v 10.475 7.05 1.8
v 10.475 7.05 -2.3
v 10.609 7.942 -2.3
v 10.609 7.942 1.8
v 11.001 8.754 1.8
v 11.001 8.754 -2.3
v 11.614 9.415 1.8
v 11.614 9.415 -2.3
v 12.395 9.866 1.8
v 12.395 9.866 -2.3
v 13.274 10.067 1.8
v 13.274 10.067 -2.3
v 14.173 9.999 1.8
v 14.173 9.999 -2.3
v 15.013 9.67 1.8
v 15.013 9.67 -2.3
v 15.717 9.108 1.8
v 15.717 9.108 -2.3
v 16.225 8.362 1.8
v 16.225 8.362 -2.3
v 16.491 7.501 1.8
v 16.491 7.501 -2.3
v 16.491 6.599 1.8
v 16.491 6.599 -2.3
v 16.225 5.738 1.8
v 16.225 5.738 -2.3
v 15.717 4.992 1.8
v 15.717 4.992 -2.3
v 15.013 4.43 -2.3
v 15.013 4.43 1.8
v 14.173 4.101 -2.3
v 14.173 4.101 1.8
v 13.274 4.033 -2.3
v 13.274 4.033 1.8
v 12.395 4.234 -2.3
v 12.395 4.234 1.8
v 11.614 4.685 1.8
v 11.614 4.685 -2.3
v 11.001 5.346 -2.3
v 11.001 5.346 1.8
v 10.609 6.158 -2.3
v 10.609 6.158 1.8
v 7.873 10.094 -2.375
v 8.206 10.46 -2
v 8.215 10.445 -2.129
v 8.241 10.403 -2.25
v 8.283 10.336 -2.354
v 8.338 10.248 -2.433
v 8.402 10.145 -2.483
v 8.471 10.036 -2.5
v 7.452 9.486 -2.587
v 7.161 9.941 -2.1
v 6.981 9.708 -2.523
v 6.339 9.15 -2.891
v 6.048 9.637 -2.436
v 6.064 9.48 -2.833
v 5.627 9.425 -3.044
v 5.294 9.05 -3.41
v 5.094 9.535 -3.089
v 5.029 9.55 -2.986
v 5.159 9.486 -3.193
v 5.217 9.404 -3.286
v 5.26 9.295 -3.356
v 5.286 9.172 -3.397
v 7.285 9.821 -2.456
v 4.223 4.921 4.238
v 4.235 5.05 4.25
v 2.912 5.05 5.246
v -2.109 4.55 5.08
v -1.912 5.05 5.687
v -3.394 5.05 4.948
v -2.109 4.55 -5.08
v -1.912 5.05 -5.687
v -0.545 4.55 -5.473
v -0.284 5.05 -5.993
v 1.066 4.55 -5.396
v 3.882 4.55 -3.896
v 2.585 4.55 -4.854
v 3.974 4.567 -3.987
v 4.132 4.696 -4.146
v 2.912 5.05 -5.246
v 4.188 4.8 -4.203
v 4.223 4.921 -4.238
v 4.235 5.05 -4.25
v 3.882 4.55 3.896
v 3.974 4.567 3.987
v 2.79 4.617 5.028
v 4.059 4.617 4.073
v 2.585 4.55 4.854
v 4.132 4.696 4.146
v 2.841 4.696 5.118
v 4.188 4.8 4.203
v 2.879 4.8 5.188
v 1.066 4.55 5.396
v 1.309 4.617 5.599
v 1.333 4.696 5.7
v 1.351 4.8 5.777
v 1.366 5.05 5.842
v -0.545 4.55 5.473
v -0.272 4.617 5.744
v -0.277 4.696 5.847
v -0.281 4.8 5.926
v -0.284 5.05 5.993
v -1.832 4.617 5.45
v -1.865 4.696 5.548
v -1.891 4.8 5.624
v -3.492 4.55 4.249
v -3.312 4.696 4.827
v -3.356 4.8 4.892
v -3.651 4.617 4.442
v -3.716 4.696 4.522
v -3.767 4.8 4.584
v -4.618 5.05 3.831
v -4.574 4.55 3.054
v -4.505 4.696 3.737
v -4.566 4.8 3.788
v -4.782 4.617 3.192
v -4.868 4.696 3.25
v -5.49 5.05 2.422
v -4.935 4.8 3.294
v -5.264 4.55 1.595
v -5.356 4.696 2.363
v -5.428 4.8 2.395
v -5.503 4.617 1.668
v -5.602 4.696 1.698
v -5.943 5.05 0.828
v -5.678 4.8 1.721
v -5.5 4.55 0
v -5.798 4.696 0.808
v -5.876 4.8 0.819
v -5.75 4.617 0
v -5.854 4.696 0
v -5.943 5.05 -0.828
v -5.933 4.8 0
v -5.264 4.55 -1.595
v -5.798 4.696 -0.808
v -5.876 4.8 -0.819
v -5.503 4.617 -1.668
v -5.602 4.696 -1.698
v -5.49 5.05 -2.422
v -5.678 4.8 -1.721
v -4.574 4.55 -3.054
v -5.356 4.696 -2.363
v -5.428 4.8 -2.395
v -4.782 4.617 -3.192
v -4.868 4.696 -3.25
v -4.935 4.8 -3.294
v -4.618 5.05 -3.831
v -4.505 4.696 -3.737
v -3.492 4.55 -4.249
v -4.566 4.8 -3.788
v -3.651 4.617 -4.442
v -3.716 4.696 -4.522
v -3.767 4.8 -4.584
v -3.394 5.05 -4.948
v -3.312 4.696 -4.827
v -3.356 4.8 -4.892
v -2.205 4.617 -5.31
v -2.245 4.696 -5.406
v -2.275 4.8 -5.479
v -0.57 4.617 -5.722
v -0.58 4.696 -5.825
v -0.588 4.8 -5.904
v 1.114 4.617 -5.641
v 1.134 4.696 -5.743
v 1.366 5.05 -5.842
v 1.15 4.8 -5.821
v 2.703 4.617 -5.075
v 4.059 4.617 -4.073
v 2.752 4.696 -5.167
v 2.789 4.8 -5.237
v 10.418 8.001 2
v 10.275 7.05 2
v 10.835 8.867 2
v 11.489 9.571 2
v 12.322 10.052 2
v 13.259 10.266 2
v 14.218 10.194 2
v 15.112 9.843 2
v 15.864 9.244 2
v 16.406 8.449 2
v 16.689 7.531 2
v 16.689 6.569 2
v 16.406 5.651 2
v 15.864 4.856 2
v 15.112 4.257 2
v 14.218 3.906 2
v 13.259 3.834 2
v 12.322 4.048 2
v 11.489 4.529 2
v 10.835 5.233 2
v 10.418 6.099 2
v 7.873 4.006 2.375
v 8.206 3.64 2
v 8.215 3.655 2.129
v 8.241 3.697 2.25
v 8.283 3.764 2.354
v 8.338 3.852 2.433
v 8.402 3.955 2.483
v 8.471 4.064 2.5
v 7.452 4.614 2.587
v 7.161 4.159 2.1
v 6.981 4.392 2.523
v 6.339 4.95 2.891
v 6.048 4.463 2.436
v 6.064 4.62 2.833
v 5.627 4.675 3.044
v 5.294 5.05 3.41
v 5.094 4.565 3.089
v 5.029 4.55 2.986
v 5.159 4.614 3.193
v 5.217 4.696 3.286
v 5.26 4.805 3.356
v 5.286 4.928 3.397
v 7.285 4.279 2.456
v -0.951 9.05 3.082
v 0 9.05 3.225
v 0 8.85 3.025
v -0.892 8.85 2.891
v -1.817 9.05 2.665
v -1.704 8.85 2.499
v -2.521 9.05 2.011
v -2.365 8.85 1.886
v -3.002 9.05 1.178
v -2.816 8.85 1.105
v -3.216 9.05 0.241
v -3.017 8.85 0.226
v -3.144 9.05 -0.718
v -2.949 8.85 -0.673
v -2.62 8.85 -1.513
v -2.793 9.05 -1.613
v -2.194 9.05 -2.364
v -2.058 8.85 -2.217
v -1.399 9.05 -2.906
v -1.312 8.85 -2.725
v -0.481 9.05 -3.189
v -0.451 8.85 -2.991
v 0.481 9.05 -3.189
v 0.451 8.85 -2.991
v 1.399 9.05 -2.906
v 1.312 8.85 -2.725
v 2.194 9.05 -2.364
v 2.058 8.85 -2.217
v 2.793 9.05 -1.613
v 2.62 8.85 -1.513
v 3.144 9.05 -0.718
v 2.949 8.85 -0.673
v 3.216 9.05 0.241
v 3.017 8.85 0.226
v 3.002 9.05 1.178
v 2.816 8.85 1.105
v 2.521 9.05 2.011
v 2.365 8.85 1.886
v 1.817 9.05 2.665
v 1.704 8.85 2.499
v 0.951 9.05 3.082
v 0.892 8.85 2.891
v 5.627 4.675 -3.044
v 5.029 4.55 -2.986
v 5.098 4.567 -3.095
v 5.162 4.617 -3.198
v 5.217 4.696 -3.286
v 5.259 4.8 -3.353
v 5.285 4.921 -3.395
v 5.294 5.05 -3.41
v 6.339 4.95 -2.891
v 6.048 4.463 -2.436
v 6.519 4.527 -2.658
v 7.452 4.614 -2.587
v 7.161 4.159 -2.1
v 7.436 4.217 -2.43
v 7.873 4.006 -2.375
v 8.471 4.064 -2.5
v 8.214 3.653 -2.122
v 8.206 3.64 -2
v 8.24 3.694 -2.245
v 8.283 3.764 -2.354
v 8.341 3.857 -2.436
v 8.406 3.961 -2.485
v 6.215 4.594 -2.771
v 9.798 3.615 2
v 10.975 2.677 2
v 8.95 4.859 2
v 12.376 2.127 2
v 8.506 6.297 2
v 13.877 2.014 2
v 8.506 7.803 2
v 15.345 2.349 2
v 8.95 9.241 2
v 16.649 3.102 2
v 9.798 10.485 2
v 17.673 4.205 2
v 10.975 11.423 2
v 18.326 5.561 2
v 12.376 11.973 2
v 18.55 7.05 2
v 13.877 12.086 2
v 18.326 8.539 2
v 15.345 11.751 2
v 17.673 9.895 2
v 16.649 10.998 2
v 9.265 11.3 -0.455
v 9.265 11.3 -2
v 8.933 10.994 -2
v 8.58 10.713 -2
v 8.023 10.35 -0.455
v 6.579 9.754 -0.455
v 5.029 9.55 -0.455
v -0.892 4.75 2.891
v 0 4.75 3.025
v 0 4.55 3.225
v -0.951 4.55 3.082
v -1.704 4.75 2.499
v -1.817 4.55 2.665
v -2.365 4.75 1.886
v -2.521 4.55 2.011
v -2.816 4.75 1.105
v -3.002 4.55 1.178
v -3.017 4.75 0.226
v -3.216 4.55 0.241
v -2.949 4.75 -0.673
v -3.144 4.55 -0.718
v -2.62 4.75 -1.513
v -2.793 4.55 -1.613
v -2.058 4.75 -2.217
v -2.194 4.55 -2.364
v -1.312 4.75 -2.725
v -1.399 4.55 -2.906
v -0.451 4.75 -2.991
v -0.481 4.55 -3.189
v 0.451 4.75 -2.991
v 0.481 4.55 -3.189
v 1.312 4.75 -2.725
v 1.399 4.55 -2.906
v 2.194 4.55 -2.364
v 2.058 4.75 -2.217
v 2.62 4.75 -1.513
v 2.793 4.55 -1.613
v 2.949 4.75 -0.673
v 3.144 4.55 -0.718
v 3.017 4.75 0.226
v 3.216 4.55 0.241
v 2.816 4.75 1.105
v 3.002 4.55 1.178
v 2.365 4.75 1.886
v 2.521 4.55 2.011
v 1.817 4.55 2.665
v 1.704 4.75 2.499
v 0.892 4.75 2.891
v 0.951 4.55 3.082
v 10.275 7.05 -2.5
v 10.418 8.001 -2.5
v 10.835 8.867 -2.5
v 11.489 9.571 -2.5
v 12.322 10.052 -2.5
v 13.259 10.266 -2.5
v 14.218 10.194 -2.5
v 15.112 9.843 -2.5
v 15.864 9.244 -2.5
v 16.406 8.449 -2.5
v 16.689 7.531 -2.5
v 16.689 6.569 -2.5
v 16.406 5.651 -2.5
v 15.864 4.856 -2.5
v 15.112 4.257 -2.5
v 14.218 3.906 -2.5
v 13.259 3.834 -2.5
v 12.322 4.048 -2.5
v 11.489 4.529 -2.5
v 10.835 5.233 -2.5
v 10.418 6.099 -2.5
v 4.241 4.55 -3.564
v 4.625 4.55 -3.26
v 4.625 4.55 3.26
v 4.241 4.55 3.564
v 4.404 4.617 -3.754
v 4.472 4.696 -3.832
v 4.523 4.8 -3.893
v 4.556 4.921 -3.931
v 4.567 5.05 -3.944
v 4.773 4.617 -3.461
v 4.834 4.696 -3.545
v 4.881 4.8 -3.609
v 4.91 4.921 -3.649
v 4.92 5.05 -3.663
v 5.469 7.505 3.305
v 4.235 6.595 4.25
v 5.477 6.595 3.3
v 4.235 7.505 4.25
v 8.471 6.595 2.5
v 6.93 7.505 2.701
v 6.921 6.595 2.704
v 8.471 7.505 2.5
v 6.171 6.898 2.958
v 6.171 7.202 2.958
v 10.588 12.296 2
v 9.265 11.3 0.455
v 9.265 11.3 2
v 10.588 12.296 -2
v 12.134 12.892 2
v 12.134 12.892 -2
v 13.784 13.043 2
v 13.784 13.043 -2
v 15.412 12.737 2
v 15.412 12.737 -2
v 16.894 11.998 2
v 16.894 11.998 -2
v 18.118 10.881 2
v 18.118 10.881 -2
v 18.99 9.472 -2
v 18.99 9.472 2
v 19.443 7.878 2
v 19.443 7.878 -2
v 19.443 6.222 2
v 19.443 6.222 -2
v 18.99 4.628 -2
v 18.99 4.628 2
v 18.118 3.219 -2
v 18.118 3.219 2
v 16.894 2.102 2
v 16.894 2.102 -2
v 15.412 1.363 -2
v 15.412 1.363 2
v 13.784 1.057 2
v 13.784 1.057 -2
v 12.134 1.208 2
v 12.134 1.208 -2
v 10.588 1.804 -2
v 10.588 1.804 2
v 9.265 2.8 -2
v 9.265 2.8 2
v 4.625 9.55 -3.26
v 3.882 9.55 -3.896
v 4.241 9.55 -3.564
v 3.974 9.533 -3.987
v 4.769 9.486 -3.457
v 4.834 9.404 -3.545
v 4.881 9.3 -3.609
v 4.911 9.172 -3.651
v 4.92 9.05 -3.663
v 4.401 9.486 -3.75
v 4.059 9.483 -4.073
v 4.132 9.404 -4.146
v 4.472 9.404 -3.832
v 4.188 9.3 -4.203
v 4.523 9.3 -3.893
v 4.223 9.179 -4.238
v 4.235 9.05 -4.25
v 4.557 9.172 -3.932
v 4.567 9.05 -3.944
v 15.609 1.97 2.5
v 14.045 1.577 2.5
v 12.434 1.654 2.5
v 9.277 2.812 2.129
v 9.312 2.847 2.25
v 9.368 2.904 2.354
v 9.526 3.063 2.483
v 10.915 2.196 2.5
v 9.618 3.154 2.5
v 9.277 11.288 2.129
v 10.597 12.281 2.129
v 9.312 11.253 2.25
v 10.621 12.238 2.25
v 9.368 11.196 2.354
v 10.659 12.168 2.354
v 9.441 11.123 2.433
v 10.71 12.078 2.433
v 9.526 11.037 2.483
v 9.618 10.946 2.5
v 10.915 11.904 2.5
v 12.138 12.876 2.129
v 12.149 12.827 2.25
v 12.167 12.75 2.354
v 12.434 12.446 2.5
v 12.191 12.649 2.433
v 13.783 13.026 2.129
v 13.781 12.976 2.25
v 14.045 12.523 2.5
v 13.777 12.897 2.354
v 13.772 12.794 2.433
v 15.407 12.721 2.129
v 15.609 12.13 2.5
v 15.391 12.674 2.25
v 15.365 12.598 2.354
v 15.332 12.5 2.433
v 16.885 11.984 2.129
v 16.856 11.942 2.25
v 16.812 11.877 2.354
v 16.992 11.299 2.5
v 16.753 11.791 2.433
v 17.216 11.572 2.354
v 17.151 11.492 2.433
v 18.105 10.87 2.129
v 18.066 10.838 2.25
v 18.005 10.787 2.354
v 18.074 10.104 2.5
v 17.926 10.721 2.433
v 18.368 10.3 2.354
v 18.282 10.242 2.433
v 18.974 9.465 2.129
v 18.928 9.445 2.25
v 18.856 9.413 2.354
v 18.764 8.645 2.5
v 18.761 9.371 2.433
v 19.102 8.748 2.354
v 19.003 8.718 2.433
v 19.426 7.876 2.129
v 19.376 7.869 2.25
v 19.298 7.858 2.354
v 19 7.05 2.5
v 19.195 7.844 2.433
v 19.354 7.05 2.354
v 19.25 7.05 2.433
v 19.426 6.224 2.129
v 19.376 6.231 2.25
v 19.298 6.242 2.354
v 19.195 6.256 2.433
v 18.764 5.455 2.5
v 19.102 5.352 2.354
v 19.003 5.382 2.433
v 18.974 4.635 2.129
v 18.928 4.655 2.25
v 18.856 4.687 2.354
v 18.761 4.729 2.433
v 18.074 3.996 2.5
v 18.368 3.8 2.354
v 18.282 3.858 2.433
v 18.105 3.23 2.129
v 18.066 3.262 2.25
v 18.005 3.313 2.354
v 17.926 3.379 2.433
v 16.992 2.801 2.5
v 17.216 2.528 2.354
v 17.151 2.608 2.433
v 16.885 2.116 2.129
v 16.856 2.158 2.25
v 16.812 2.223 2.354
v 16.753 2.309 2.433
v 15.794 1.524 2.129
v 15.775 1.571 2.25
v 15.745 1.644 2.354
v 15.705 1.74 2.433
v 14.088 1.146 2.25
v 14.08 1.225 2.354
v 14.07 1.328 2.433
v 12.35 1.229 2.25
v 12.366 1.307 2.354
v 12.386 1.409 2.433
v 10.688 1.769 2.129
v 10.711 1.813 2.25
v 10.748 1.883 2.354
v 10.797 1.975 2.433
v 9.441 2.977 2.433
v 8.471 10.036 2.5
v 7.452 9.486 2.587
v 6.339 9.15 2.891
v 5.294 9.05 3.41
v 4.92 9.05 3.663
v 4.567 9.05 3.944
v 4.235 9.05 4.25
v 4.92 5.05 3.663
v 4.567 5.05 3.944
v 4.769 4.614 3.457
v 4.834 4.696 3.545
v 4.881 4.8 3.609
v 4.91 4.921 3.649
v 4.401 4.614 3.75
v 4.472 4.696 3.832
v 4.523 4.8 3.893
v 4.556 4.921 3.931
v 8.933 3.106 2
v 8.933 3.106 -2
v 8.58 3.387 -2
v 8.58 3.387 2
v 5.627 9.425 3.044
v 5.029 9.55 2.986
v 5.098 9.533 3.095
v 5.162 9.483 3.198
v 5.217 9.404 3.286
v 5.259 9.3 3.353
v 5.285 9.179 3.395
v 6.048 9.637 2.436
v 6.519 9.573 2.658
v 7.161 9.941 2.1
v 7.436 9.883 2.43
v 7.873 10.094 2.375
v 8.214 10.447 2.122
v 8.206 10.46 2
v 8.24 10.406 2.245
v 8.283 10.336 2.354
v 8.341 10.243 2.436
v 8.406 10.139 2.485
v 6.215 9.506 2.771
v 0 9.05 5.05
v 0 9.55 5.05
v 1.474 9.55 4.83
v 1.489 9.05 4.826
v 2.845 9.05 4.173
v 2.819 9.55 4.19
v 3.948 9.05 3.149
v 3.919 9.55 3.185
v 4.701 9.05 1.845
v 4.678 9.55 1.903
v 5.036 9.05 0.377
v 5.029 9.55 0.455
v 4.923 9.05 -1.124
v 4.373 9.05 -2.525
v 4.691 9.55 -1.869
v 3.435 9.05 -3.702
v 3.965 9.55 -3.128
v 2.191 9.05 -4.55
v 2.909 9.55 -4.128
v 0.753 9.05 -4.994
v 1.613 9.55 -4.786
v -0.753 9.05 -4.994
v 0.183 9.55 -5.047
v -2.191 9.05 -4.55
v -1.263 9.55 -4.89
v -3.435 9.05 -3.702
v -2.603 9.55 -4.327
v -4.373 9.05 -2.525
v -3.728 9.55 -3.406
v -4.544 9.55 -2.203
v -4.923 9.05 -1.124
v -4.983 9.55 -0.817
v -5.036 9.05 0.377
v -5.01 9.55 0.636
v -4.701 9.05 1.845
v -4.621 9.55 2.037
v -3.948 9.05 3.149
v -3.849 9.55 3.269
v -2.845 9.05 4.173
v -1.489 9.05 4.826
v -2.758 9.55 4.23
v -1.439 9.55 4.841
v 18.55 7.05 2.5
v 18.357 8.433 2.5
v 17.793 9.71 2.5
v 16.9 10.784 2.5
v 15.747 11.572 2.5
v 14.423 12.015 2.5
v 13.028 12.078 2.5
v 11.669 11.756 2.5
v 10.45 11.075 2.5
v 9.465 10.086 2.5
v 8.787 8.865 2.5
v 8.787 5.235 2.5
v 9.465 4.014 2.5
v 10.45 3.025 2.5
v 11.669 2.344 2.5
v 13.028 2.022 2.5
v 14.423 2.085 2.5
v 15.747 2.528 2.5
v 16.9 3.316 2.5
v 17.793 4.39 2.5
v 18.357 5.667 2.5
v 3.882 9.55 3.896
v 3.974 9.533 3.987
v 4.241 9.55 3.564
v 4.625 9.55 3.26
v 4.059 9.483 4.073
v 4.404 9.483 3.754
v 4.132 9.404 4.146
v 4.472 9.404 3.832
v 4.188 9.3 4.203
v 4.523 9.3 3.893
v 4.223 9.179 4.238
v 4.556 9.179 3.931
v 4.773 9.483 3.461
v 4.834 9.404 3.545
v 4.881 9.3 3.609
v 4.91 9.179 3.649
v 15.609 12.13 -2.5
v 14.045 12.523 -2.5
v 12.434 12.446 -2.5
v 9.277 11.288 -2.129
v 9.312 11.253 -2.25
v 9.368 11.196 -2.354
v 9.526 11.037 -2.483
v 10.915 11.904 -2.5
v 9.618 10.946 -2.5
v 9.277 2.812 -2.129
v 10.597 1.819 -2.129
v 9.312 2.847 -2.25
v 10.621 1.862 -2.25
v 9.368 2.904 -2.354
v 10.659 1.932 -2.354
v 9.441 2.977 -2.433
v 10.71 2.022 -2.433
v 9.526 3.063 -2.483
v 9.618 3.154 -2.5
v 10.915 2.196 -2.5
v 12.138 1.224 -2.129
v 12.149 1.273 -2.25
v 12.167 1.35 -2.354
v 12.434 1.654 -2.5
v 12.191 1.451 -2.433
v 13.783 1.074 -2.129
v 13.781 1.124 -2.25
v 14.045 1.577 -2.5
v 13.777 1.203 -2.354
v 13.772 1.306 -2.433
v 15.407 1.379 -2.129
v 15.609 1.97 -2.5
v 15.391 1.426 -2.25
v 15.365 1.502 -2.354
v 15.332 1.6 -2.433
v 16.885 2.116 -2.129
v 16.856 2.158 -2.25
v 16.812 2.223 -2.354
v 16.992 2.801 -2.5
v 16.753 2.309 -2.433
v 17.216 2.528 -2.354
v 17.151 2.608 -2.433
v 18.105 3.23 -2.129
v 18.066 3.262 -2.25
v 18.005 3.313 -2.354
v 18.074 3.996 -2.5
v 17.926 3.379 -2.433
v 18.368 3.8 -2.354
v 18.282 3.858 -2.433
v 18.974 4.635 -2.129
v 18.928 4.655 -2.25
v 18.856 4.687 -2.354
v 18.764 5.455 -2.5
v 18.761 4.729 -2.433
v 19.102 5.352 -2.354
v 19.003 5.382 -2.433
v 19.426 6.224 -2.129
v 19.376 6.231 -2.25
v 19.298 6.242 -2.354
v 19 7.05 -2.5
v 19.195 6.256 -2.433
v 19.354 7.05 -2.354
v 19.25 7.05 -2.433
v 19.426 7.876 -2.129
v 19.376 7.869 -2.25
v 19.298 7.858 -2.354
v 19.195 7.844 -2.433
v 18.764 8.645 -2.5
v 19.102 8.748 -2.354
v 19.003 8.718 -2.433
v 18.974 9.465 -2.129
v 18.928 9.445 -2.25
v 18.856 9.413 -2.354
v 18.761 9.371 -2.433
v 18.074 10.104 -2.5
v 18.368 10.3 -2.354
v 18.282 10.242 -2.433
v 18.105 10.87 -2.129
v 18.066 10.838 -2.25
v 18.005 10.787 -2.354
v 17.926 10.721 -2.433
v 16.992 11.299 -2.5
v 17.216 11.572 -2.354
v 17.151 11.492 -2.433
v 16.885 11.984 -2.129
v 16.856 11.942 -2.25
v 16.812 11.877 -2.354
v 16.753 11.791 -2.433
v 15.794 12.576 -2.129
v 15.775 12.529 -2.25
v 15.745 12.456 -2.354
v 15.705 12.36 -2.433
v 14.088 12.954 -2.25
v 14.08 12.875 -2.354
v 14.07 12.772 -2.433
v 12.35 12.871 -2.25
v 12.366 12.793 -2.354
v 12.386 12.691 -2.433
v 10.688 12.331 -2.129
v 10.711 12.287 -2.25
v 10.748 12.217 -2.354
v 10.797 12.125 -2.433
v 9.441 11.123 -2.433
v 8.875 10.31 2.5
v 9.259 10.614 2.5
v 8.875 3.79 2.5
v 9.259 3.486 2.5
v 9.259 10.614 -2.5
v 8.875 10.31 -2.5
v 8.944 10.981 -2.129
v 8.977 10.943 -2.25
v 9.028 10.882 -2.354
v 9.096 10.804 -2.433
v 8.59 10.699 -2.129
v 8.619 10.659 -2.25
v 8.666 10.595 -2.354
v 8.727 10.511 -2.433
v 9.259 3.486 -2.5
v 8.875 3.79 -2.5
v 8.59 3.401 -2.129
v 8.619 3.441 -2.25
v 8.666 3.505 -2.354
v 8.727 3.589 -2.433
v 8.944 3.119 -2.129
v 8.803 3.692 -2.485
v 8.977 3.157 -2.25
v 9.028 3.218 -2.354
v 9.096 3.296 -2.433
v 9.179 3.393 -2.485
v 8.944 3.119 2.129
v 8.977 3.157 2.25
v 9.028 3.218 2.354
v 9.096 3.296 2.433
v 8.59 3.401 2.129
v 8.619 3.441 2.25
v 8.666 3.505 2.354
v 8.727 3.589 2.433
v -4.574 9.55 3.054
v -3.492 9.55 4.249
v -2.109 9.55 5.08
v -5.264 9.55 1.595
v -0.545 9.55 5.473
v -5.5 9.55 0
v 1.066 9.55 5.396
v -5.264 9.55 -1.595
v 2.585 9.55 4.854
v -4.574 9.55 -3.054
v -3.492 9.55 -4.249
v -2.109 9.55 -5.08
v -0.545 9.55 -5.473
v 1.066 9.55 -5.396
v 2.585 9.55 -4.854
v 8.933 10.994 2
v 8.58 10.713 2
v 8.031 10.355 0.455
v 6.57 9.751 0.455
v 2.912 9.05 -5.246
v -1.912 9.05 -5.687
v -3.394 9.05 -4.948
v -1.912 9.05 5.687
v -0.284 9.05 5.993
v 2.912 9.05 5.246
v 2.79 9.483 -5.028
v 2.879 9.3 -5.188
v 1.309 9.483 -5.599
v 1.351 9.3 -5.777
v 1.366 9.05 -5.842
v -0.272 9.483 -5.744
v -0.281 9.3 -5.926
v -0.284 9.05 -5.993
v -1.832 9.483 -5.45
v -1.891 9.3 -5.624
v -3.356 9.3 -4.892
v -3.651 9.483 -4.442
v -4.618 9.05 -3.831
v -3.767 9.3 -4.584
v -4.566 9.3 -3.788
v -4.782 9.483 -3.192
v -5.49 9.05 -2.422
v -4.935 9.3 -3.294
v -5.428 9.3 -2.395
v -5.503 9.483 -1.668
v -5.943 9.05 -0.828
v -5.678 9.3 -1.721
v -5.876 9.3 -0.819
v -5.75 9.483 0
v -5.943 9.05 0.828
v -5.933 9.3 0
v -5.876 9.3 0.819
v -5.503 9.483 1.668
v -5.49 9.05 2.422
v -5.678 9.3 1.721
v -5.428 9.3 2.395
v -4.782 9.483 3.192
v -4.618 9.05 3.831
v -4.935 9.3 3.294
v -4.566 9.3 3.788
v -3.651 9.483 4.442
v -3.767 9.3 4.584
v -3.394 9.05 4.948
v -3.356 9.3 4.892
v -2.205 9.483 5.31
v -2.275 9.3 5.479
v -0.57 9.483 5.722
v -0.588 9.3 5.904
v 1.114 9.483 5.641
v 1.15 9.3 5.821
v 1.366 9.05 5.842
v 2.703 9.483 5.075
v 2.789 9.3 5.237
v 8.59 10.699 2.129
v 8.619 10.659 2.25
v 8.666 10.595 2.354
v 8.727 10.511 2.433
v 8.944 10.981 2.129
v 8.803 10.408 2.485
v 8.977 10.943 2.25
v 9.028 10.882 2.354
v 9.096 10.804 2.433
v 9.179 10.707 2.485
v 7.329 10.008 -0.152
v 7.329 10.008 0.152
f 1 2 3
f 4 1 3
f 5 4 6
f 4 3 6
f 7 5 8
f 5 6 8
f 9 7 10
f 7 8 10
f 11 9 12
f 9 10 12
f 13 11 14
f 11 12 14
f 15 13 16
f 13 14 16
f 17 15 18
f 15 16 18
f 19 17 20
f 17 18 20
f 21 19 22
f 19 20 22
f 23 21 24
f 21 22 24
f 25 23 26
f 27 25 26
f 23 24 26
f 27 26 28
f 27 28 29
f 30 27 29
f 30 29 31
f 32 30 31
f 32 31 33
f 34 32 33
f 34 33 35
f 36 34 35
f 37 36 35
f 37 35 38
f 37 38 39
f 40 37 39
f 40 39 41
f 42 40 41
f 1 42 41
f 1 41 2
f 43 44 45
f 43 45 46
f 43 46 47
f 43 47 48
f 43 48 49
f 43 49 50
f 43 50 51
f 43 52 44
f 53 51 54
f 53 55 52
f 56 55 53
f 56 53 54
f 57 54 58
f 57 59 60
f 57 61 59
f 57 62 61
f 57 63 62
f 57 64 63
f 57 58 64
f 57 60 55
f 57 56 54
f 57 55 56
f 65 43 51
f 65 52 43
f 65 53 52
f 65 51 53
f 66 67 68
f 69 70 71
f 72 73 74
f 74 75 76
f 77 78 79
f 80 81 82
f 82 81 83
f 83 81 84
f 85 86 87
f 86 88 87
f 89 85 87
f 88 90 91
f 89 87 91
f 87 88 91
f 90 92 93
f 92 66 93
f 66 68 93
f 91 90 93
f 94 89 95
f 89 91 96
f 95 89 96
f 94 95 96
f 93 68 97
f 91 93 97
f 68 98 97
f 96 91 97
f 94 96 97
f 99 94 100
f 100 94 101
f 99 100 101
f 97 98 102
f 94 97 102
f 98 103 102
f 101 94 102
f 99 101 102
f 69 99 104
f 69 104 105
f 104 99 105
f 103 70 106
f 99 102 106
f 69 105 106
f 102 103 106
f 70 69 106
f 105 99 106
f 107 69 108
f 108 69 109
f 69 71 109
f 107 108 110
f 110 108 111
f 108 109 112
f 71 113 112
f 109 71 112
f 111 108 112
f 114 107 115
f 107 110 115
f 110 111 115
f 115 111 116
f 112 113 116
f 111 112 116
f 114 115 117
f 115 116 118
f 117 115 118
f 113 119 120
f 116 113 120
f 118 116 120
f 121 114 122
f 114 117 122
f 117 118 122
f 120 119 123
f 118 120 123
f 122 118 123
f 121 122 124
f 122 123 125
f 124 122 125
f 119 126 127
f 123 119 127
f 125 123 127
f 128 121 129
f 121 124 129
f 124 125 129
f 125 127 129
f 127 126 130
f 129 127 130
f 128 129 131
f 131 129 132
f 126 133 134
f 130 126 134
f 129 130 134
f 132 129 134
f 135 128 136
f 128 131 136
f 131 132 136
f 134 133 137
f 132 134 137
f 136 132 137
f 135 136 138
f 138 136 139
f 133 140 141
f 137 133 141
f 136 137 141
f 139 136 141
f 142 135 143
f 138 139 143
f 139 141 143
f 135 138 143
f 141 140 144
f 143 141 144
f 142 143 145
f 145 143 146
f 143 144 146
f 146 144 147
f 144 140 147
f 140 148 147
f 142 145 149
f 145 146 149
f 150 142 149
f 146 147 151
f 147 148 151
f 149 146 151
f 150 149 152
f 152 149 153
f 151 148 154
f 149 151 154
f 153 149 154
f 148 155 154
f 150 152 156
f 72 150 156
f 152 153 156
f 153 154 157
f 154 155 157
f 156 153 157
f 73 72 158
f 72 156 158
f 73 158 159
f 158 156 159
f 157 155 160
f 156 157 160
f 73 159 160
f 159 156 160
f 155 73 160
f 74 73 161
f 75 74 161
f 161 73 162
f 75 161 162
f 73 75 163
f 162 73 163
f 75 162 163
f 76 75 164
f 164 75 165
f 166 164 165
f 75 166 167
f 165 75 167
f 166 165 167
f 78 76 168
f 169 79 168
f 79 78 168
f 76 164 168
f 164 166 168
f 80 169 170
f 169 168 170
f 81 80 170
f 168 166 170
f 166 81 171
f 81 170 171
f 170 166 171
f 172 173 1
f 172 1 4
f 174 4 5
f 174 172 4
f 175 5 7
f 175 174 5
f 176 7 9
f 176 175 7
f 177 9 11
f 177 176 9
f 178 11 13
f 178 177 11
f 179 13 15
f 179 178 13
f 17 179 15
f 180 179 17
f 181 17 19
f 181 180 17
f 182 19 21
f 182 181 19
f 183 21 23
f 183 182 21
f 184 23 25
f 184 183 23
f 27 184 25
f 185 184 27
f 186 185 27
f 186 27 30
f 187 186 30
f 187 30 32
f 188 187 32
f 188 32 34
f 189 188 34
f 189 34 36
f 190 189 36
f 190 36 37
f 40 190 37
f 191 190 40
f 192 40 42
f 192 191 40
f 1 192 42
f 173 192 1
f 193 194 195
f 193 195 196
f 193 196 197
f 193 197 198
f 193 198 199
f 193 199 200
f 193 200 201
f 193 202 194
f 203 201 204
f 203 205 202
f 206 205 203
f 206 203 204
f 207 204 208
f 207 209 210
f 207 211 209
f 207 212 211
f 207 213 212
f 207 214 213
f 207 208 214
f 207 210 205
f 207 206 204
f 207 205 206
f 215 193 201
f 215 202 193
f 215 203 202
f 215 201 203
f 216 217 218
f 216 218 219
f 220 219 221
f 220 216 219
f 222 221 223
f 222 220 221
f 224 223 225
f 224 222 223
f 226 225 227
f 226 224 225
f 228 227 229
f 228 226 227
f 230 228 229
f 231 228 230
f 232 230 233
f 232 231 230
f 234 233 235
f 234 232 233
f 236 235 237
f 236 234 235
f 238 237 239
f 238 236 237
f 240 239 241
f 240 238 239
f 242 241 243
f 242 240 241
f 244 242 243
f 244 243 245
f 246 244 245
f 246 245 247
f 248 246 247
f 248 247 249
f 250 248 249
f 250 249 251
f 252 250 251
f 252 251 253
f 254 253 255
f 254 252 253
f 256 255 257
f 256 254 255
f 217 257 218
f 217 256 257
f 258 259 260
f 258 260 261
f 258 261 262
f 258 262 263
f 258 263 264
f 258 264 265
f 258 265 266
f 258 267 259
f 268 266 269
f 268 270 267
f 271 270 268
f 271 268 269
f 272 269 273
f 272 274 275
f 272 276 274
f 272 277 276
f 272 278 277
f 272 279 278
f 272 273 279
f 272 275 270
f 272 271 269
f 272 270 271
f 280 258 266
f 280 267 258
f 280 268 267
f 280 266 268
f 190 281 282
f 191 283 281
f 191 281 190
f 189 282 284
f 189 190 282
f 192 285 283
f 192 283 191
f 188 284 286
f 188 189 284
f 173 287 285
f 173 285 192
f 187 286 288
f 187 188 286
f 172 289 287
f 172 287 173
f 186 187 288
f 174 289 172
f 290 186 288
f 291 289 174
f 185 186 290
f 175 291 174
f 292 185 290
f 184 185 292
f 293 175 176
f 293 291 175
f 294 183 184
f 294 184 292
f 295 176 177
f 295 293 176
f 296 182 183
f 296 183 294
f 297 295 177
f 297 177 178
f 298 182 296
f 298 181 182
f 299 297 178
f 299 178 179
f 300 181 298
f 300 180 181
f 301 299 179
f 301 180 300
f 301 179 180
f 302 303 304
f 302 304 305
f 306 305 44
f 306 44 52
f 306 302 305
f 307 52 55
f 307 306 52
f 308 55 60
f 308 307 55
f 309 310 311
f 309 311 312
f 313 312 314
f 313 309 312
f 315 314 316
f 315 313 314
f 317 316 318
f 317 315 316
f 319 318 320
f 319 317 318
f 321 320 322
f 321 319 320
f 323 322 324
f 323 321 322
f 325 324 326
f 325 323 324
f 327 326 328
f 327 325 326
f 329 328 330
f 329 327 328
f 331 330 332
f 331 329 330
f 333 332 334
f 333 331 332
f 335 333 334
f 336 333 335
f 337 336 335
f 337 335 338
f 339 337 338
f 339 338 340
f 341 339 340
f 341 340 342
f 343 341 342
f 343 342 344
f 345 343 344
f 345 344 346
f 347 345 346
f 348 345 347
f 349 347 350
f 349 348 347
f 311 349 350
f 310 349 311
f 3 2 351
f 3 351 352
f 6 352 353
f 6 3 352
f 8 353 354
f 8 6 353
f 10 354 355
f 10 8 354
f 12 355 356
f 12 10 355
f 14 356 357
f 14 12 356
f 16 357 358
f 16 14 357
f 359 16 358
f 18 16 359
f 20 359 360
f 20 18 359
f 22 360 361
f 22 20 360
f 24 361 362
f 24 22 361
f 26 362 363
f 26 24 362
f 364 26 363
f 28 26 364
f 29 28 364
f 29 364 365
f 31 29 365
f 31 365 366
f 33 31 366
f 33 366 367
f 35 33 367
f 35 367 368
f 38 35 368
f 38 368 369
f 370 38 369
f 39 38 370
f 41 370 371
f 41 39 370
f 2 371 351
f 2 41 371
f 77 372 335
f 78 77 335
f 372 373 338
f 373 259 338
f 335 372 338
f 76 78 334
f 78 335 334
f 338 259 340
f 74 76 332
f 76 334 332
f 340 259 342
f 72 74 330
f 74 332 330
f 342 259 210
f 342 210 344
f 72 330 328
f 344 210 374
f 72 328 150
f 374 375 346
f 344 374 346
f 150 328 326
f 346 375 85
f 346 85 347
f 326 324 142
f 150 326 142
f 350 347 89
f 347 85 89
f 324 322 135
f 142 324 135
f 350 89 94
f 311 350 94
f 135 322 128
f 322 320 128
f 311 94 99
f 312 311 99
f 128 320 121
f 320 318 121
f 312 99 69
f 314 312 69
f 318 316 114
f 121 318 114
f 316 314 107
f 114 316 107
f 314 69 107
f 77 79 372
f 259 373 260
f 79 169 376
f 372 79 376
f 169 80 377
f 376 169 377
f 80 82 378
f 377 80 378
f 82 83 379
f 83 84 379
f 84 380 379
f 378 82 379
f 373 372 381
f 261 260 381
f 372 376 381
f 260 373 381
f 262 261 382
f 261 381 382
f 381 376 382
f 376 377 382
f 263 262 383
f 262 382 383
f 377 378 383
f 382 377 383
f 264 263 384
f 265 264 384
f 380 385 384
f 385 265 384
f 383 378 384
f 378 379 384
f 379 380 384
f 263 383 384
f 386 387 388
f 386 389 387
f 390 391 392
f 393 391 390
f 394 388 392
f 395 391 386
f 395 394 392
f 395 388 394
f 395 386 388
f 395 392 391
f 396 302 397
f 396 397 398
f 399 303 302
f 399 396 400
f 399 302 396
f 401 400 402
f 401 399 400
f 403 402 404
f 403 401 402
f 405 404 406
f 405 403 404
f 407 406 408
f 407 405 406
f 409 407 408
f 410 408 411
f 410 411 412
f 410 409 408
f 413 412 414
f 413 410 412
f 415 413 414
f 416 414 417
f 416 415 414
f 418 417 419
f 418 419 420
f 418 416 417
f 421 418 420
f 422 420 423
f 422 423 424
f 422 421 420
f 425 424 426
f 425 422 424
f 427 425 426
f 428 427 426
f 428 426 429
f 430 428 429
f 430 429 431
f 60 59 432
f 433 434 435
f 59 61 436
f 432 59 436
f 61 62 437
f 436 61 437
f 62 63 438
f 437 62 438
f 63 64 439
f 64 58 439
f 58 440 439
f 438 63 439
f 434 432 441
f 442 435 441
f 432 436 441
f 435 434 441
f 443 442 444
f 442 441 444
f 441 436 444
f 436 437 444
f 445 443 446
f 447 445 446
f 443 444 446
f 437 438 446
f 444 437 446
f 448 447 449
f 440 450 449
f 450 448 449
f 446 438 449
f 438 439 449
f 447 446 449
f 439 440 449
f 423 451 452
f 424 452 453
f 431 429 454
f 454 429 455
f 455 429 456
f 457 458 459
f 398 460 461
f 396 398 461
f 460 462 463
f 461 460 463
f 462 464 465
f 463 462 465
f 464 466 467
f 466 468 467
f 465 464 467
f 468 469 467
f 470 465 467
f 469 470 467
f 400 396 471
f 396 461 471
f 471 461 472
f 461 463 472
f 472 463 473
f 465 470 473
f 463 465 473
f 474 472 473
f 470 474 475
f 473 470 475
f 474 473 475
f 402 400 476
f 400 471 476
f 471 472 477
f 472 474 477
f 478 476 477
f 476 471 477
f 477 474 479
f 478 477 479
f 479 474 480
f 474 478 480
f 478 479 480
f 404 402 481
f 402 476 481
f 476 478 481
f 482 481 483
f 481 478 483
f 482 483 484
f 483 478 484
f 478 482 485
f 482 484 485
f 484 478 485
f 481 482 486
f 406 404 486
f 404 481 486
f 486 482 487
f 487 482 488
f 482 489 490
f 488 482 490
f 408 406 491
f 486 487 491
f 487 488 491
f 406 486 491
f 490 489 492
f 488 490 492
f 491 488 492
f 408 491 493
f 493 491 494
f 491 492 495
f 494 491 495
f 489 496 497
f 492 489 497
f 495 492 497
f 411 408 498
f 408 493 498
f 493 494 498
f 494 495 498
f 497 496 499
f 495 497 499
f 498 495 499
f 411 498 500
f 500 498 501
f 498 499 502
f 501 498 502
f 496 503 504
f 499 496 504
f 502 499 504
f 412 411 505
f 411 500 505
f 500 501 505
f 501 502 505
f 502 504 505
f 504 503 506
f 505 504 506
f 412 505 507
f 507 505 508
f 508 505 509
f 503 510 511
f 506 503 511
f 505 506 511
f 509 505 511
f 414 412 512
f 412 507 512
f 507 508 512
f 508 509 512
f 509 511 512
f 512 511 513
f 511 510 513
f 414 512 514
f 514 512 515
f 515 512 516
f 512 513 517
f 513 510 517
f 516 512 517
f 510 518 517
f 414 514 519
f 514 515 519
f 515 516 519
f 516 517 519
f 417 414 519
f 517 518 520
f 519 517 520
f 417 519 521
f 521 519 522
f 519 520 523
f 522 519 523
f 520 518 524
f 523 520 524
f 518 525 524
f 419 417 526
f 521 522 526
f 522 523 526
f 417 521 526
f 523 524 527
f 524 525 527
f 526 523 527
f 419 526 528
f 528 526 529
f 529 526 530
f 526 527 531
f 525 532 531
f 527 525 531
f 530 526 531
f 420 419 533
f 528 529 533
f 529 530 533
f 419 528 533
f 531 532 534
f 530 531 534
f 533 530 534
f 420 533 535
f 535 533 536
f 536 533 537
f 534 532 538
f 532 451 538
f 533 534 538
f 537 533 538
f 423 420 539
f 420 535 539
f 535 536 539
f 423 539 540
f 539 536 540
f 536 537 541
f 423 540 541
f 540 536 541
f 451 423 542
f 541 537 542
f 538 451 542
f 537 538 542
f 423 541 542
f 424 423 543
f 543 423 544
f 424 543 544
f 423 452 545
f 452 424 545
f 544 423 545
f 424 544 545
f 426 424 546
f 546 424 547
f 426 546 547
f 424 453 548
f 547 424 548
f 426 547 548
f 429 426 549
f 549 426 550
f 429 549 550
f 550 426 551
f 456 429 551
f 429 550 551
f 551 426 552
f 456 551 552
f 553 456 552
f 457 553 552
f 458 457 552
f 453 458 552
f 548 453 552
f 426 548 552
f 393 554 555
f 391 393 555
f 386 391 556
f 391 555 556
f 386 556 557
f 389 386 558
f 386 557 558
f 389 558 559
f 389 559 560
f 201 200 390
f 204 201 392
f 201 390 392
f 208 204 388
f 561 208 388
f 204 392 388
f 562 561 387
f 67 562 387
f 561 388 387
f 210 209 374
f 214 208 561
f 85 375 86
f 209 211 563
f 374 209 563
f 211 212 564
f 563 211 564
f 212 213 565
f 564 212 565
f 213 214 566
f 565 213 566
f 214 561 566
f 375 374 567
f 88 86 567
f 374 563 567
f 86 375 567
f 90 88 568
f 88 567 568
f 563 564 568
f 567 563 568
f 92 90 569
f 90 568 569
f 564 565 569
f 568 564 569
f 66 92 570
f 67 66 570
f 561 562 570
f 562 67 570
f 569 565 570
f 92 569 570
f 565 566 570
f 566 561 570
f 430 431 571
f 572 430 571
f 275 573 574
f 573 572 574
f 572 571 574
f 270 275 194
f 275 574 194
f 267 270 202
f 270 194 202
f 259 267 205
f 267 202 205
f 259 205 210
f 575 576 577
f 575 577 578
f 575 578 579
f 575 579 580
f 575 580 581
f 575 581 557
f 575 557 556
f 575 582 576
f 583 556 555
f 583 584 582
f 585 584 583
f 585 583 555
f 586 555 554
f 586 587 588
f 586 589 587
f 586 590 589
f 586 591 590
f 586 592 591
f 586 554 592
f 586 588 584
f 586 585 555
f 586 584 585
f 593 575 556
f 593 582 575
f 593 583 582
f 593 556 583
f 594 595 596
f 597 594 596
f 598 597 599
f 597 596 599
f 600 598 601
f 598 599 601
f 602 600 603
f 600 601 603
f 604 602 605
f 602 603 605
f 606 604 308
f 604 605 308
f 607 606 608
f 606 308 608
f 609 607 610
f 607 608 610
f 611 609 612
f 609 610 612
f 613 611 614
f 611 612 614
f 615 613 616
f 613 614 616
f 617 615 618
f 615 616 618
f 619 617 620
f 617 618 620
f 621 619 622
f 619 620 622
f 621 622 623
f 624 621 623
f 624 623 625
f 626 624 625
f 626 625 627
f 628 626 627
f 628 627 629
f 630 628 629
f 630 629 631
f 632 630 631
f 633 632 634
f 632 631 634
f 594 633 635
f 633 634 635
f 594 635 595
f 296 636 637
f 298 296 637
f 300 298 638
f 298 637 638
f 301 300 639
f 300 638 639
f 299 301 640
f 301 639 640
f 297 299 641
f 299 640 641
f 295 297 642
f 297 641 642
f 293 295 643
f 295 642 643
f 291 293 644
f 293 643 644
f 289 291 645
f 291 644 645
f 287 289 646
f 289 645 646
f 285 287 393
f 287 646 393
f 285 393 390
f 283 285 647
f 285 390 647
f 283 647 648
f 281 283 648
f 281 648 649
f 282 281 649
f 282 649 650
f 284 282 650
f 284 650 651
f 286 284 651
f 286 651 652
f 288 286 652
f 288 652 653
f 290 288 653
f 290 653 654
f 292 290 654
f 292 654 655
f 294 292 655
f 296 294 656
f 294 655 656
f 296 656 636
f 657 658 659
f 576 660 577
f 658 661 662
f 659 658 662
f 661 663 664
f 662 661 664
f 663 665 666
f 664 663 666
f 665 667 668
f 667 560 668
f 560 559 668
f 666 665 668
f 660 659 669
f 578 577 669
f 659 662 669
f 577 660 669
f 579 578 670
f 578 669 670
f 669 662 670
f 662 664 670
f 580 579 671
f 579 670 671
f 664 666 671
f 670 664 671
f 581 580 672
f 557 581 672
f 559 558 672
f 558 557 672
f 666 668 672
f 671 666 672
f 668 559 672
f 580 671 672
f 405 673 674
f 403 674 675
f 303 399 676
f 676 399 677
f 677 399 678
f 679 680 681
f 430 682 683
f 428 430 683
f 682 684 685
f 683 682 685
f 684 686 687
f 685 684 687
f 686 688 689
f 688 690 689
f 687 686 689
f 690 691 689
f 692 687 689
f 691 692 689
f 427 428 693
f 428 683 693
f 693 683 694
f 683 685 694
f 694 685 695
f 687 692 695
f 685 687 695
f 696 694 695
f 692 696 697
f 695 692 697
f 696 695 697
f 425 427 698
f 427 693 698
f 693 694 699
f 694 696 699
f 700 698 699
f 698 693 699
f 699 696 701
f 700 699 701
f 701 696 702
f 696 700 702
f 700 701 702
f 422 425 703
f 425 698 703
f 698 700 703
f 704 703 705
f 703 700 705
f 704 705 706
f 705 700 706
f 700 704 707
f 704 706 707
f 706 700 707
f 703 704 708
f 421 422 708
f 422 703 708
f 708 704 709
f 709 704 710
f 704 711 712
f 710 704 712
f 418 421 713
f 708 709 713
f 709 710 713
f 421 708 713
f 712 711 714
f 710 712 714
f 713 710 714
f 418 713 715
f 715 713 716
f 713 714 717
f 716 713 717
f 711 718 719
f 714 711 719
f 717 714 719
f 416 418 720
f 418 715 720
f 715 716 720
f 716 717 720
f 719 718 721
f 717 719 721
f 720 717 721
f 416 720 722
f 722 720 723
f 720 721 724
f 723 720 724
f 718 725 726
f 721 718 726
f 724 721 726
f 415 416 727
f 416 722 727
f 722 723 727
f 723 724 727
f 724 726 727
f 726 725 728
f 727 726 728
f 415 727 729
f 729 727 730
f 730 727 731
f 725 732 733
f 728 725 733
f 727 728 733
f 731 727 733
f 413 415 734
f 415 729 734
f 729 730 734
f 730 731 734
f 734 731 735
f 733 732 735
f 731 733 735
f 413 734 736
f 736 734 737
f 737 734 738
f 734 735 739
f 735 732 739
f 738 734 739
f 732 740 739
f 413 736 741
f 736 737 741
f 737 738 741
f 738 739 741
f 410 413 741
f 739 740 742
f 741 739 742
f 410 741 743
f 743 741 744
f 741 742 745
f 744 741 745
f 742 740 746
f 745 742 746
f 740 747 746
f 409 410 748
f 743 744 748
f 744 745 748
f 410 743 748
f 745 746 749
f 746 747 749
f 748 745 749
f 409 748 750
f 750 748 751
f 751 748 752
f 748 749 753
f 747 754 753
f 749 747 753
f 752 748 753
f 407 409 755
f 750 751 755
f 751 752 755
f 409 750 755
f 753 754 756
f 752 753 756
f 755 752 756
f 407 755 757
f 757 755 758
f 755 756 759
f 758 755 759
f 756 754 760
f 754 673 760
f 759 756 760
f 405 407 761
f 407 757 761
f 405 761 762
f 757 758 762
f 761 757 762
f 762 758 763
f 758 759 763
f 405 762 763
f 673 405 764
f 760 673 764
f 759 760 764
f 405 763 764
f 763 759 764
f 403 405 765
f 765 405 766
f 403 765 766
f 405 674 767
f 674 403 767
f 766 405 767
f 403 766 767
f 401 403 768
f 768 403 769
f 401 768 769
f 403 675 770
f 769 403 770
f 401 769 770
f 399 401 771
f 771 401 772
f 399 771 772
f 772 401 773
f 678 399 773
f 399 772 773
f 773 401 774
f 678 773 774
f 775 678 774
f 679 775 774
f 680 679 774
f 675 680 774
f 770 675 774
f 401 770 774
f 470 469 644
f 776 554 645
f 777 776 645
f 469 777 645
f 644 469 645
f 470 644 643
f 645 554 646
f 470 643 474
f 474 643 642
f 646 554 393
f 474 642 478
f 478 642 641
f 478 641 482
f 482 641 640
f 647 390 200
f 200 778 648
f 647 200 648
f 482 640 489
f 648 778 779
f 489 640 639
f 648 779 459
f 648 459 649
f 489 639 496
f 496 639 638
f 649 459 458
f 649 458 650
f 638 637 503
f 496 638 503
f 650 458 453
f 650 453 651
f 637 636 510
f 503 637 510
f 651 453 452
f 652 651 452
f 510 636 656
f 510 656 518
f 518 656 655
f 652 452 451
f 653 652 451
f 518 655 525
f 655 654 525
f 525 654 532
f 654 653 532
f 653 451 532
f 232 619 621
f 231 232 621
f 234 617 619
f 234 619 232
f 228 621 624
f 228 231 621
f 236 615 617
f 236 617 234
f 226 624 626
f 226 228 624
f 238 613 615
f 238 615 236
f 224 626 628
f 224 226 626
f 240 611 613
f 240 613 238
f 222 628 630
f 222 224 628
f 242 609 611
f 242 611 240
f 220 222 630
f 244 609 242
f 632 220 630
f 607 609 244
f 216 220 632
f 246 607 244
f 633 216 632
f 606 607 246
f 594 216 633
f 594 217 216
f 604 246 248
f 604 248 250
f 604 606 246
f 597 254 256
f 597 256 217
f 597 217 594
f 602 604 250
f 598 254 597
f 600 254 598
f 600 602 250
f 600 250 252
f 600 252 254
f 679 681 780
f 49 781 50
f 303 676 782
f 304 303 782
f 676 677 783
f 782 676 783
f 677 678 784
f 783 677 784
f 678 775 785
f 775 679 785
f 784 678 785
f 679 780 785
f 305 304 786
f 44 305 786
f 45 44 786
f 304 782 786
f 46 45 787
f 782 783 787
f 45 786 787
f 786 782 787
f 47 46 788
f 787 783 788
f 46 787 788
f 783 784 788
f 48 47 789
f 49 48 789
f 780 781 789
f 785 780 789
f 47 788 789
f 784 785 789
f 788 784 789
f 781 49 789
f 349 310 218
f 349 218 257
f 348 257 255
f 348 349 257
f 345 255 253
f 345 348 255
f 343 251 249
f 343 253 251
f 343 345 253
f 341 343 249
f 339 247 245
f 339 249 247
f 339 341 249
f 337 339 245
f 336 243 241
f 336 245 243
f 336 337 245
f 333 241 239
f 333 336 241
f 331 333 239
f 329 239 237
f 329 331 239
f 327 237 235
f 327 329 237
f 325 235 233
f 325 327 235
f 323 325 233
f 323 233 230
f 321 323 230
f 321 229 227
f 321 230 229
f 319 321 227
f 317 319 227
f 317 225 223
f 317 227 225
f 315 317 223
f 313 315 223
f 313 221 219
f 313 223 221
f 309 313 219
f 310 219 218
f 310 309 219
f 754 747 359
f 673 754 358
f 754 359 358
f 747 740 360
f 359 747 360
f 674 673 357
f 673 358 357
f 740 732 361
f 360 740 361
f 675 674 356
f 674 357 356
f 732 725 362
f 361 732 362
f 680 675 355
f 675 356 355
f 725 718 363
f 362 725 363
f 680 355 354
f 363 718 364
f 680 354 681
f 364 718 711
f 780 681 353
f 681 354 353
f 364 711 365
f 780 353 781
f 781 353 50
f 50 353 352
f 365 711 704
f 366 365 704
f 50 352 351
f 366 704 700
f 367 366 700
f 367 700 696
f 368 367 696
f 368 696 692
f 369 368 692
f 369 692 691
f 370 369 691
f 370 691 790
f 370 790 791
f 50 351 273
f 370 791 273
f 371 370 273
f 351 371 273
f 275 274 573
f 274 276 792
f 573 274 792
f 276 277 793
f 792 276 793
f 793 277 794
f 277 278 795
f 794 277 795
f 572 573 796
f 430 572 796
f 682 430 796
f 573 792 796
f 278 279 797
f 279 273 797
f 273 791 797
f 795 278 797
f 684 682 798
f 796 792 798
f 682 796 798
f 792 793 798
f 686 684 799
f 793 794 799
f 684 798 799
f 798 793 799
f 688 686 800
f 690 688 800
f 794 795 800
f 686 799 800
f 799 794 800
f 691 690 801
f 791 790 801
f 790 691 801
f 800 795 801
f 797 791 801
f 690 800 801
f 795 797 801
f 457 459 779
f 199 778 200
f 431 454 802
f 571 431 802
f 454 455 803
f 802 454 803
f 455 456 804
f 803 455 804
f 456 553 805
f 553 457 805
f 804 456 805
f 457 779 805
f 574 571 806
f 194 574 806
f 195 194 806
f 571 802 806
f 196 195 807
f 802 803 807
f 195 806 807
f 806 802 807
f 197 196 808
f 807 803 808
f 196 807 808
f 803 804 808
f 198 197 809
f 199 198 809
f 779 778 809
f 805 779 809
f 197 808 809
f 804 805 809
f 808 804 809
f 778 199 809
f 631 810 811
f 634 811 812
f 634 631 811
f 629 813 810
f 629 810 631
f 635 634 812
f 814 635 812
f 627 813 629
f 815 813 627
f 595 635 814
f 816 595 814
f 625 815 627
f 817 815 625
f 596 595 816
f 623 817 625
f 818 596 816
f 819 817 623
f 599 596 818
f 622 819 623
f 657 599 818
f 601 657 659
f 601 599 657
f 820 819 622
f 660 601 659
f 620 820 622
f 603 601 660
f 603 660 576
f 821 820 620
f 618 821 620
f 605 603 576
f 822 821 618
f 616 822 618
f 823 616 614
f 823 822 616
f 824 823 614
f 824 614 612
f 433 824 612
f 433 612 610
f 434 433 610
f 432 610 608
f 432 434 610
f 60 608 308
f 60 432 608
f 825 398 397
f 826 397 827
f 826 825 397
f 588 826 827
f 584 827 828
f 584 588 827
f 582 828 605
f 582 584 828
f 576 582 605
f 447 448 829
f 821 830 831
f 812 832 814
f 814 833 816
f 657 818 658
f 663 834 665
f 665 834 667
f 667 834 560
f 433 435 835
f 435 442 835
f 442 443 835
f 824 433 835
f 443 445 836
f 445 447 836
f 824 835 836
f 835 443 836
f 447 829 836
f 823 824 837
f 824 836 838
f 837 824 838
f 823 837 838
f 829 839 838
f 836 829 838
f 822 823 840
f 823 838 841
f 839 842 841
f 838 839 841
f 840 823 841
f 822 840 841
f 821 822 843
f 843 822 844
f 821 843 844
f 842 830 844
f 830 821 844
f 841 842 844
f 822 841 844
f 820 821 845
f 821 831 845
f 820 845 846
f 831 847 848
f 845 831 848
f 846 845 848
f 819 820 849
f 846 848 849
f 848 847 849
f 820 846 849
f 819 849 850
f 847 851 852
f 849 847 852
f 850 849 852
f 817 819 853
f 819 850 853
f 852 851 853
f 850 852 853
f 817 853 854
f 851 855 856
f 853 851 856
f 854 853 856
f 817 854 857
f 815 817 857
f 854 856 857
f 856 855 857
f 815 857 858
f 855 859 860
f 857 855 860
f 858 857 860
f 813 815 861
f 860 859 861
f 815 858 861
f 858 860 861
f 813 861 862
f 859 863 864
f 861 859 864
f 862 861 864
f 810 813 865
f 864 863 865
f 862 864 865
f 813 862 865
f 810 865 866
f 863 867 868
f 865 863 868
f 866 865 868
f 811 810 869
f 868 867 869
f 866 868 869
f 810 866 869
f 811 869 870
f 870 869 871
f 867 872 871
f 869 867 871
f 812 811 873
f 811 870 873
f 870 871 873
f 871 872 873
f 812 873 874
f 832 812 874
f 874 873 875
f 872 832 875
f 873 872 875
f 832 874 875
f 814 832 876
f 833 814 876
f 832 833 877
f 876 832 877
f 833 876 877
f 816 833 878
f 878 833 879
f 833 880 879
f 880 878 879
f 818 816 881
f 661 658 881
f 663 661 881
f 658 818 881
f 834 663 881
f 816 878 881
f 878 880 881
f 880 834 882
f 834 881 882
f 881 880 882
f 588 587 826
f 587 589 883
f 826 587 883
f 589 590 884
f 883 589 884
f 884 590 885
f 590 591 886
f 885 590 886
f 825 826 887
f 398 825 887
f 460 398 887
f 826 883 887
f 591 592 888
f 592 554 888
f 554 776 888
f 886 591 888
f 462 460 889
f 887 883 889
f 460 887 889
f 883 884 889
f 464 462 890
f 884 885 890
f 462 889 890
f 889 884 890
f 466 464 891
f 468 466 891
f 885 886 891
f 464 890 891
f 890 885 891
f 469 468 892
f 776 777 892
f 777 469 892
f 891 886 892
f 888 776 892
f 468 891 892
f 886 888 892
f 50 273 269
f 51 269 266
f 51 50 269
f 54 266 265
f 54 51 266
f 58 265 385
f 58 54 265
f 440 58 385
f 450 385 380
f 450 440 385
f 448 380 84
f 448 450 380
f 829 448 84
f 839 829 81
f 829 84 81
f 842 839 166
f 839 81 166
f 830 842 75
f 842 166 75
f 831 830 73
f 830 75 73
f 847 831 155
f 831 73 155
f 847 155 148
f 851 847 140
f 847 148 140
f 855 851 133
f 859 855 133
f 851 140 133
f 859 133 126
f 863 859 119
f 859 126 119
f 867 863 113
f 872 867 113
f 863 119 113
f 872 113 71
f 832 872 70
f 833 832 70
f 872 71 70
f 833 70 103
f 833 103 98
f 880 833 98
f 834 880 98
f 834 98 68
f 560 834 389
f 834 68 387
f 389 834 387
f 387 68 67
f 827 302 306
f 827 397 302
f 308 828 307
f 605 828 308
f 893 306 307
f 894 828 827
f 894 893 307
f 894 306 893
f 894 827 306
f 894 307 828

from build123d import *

# Parameters (mm, degrees)
SKETCH1_R               = 3.025
BOSS_EXTRUDE1_DEPTH     = 14.1
CUT_EXTRUDE1_DEPTH      = 26.996345897
CUT_EXTRUDE1_DEPTH_BACK = 26.996345897
SKETCH2_W               = 12
SKETCH2_H               = 4.55
SKETCH3_R               = 3.025
CUT_EXTRUDE2_DEPTH      = 27.684452402
CUT_EXTRUDE3_DEPTH      = 10
SKETCH6_R               = 5.05
CUT_EXTRUDE4_DEPTH      = 0.5
SKETCH7_R               = 5.05
CUT_EXTRUDE5_DEPTH      = 0.5
FILLET1_R               = 6
CHAMFER1_SIZE           = 0.2
FILLET2_R               = 0.5


with BuildPart() as part:
    # Sketch1 → Boss-Extrude1 (new body)
    with BuildSketch(Plane(origin=(0, 0, 0), x_dir=(1, 0, 0), z_dir=(0, 1, 0))):
        with BuildLine():
            Line((21, -2.5), (21, 2.5))
            Line((21, 2.5), (5.454356057, 2.5))
            ThreePointArc((5.454356057, 2.5), (-6, 0), (5.454356057, -2.5))
            Line((5.454356057, -2.5), (21, -2.5))
        make_face()
        Circle(SKETCH1_R, mode=Mode.SUBTRACT)
    extrude(amount=BOSS_EXTRUDE1_DEPTH)

    # Sketch2 → Cut-Extrude1 (cut, two sides: drawn at the far end of the back side and taken through both)
    with BuildSketch(Plane(origin=(0, 0, 0), x_dir=(-1, 0, 0), z_dir=(0, 0, -1)).offset(-CUT_EXTRUDE1_DEPTH_BACK)):
        with Locations((0, 2.275)):
            Rectangle(SKETCH2_W, SKETCH2_H)
        with Locations((0, 11.825)):
            Rectangle(SKETCH2_W, SKETCH2_H)
    extrude(amount=CUT_EXTRUDE1_DEPTH + CUT_EXTRUDE1_DEPTH_BACK, mode=Mode.SUBTRACT)

    # Sketch3 → Cut-Extrude2 (cut, through all)
    with BuildSketch(Plane(origin=(0, 0, -2.5), x_dir=(-1, 0, 0), z_dir=(0, 0, -1))):
        with Locations((-13.5, 7.05)):
            Circle(SKETCH3_R)
    extrude(amount=-CUT_EXTRUDE2_DEPTH, mode=Mode.SUBTRACT)

    # Sketch4 → Cut-Extrude3 (cut)
    with BuildSketch(Plane(origin=(0, 0, -2.5), x_dir=(-1, 0, 0), z_dir=(0, 0, -1))):
        with BuildLine():
            Line((-8.045643943, 9.55), (-6, 9.55))
            Line((-6, 9.55), (-6, 14.1))
            Line((-6, 14.1), (-21, 14.1))
            Line((-21, 14.1), (-21, 0))
            Line((-21, 0), (-6, 0))
            Line((-6, 0), (-6, 4.55))
            Line((-6, 4.55), (-8.045643943, 4.55))
            ThreePointArc((-8.045643943, 4.55), (-19.5, 7.05), (-8.045643943, 9.55))
        make_face()
    extrude(amount=-CUT_EXTRUDE3_DEPTH, mode=Mode.SUBTRACT)

    # Sketch6 → Cut-Extrude4 (cut)
    with BuildSketch(Plane(origin=(0, 9.55, 0), x_dir=(1, 0, 0), z_dir=(0, 1, 0))):
        Circle(SKETCH6_R)
    extrude(amount=-CUT_EXTRUDE4_DEPTH, mode=Mode.SUBTRACT)

    # Sketch7 → Cut-Extrude5 (cut)
    with BuildSketch(Plane.XY.offset(2.5)):
        with Locations((13.5, 7.05)):
            Circle(SKETCH7_R)
    extrude(amount=-CUT_EXTRUDE5_DEPTH, mode=Mode.SUBTRACT)

    # Fillet1
    fillet1_edges = [part.edges().sort_by_distance(p)[0] for p in [
        (5.454356057, 7.05, 2.5),
    ]]
    fillet(fillet1_edges, radius=FILLET1_R)
    fillet1_2_edges = [part.edges().sort_by_distance(p)[0] for p in [
        (8.045643943, 4.55, 0.007531715),
    ]]
    fillet(fillet1_2_edges, radius=FILLET1_R)
    fillet1_3_edges = [part.edges().sort_by_distance(p)[0] for p in [
        (5.454356057, 7.042468285, -2.5),
    ]]
    fillet(fillet1_3_edges, radius=FILLET1_R)
    fillet1_4_edges = [part.edges().sort_by_distance(p)[0] for p in [
        (8.045643943, 9.55, 0),
    ]]
    fillet(fillet1_4_edges, radius=FILLET1_R)

    # Chamfer1
    chamfer1_edges = [part.edges().sort_by_distance(p)[0] for p in [
        (16.525, 7.05, -2.5),
        (-3.025, 4.55, 0),
        (16.525, 7.05, 2),
        (-3.025, 9.05, 0),
    ]]
    chamfer(chamfer1_edges, length=CHAMFER1_SIZE)

    # Fillet2
    fillet2_edges = [part.edges().sort_by_distance(p)[0] for p in [
        (6.75, 9.801978442, 2.751978442),
        (19.5, 7.05, 2.5),
        (6.75, 4.298021558, 2.751978442),
        (-6, 4.55, 0),
        (6.75, 4.298021558, -2.751978442),
        (19.5, 7.05, -2.5),
        (6.75, 9.801978442, -2.751978442),
        (-6, 9.55, 0),
        (4.617982599, 9.55, 3.900236609),
        (4.617982599, 9.55, -3.900236609),
        (8.882017401, 10.950236609, 2.5),
        (8.882017401, 3.149763391, 2.5),
        (4.617982599, 4.55, 3.900236609),
        (4.617982599, 4.55, -3.900236609),
        (8.882017401, 3.149763391, -2.5),
        (8.882017401, 10.950236609, -2.5),
    ]]
    fillet(fillet2_edges, radius=FILLET2_R)


solid = part.part
